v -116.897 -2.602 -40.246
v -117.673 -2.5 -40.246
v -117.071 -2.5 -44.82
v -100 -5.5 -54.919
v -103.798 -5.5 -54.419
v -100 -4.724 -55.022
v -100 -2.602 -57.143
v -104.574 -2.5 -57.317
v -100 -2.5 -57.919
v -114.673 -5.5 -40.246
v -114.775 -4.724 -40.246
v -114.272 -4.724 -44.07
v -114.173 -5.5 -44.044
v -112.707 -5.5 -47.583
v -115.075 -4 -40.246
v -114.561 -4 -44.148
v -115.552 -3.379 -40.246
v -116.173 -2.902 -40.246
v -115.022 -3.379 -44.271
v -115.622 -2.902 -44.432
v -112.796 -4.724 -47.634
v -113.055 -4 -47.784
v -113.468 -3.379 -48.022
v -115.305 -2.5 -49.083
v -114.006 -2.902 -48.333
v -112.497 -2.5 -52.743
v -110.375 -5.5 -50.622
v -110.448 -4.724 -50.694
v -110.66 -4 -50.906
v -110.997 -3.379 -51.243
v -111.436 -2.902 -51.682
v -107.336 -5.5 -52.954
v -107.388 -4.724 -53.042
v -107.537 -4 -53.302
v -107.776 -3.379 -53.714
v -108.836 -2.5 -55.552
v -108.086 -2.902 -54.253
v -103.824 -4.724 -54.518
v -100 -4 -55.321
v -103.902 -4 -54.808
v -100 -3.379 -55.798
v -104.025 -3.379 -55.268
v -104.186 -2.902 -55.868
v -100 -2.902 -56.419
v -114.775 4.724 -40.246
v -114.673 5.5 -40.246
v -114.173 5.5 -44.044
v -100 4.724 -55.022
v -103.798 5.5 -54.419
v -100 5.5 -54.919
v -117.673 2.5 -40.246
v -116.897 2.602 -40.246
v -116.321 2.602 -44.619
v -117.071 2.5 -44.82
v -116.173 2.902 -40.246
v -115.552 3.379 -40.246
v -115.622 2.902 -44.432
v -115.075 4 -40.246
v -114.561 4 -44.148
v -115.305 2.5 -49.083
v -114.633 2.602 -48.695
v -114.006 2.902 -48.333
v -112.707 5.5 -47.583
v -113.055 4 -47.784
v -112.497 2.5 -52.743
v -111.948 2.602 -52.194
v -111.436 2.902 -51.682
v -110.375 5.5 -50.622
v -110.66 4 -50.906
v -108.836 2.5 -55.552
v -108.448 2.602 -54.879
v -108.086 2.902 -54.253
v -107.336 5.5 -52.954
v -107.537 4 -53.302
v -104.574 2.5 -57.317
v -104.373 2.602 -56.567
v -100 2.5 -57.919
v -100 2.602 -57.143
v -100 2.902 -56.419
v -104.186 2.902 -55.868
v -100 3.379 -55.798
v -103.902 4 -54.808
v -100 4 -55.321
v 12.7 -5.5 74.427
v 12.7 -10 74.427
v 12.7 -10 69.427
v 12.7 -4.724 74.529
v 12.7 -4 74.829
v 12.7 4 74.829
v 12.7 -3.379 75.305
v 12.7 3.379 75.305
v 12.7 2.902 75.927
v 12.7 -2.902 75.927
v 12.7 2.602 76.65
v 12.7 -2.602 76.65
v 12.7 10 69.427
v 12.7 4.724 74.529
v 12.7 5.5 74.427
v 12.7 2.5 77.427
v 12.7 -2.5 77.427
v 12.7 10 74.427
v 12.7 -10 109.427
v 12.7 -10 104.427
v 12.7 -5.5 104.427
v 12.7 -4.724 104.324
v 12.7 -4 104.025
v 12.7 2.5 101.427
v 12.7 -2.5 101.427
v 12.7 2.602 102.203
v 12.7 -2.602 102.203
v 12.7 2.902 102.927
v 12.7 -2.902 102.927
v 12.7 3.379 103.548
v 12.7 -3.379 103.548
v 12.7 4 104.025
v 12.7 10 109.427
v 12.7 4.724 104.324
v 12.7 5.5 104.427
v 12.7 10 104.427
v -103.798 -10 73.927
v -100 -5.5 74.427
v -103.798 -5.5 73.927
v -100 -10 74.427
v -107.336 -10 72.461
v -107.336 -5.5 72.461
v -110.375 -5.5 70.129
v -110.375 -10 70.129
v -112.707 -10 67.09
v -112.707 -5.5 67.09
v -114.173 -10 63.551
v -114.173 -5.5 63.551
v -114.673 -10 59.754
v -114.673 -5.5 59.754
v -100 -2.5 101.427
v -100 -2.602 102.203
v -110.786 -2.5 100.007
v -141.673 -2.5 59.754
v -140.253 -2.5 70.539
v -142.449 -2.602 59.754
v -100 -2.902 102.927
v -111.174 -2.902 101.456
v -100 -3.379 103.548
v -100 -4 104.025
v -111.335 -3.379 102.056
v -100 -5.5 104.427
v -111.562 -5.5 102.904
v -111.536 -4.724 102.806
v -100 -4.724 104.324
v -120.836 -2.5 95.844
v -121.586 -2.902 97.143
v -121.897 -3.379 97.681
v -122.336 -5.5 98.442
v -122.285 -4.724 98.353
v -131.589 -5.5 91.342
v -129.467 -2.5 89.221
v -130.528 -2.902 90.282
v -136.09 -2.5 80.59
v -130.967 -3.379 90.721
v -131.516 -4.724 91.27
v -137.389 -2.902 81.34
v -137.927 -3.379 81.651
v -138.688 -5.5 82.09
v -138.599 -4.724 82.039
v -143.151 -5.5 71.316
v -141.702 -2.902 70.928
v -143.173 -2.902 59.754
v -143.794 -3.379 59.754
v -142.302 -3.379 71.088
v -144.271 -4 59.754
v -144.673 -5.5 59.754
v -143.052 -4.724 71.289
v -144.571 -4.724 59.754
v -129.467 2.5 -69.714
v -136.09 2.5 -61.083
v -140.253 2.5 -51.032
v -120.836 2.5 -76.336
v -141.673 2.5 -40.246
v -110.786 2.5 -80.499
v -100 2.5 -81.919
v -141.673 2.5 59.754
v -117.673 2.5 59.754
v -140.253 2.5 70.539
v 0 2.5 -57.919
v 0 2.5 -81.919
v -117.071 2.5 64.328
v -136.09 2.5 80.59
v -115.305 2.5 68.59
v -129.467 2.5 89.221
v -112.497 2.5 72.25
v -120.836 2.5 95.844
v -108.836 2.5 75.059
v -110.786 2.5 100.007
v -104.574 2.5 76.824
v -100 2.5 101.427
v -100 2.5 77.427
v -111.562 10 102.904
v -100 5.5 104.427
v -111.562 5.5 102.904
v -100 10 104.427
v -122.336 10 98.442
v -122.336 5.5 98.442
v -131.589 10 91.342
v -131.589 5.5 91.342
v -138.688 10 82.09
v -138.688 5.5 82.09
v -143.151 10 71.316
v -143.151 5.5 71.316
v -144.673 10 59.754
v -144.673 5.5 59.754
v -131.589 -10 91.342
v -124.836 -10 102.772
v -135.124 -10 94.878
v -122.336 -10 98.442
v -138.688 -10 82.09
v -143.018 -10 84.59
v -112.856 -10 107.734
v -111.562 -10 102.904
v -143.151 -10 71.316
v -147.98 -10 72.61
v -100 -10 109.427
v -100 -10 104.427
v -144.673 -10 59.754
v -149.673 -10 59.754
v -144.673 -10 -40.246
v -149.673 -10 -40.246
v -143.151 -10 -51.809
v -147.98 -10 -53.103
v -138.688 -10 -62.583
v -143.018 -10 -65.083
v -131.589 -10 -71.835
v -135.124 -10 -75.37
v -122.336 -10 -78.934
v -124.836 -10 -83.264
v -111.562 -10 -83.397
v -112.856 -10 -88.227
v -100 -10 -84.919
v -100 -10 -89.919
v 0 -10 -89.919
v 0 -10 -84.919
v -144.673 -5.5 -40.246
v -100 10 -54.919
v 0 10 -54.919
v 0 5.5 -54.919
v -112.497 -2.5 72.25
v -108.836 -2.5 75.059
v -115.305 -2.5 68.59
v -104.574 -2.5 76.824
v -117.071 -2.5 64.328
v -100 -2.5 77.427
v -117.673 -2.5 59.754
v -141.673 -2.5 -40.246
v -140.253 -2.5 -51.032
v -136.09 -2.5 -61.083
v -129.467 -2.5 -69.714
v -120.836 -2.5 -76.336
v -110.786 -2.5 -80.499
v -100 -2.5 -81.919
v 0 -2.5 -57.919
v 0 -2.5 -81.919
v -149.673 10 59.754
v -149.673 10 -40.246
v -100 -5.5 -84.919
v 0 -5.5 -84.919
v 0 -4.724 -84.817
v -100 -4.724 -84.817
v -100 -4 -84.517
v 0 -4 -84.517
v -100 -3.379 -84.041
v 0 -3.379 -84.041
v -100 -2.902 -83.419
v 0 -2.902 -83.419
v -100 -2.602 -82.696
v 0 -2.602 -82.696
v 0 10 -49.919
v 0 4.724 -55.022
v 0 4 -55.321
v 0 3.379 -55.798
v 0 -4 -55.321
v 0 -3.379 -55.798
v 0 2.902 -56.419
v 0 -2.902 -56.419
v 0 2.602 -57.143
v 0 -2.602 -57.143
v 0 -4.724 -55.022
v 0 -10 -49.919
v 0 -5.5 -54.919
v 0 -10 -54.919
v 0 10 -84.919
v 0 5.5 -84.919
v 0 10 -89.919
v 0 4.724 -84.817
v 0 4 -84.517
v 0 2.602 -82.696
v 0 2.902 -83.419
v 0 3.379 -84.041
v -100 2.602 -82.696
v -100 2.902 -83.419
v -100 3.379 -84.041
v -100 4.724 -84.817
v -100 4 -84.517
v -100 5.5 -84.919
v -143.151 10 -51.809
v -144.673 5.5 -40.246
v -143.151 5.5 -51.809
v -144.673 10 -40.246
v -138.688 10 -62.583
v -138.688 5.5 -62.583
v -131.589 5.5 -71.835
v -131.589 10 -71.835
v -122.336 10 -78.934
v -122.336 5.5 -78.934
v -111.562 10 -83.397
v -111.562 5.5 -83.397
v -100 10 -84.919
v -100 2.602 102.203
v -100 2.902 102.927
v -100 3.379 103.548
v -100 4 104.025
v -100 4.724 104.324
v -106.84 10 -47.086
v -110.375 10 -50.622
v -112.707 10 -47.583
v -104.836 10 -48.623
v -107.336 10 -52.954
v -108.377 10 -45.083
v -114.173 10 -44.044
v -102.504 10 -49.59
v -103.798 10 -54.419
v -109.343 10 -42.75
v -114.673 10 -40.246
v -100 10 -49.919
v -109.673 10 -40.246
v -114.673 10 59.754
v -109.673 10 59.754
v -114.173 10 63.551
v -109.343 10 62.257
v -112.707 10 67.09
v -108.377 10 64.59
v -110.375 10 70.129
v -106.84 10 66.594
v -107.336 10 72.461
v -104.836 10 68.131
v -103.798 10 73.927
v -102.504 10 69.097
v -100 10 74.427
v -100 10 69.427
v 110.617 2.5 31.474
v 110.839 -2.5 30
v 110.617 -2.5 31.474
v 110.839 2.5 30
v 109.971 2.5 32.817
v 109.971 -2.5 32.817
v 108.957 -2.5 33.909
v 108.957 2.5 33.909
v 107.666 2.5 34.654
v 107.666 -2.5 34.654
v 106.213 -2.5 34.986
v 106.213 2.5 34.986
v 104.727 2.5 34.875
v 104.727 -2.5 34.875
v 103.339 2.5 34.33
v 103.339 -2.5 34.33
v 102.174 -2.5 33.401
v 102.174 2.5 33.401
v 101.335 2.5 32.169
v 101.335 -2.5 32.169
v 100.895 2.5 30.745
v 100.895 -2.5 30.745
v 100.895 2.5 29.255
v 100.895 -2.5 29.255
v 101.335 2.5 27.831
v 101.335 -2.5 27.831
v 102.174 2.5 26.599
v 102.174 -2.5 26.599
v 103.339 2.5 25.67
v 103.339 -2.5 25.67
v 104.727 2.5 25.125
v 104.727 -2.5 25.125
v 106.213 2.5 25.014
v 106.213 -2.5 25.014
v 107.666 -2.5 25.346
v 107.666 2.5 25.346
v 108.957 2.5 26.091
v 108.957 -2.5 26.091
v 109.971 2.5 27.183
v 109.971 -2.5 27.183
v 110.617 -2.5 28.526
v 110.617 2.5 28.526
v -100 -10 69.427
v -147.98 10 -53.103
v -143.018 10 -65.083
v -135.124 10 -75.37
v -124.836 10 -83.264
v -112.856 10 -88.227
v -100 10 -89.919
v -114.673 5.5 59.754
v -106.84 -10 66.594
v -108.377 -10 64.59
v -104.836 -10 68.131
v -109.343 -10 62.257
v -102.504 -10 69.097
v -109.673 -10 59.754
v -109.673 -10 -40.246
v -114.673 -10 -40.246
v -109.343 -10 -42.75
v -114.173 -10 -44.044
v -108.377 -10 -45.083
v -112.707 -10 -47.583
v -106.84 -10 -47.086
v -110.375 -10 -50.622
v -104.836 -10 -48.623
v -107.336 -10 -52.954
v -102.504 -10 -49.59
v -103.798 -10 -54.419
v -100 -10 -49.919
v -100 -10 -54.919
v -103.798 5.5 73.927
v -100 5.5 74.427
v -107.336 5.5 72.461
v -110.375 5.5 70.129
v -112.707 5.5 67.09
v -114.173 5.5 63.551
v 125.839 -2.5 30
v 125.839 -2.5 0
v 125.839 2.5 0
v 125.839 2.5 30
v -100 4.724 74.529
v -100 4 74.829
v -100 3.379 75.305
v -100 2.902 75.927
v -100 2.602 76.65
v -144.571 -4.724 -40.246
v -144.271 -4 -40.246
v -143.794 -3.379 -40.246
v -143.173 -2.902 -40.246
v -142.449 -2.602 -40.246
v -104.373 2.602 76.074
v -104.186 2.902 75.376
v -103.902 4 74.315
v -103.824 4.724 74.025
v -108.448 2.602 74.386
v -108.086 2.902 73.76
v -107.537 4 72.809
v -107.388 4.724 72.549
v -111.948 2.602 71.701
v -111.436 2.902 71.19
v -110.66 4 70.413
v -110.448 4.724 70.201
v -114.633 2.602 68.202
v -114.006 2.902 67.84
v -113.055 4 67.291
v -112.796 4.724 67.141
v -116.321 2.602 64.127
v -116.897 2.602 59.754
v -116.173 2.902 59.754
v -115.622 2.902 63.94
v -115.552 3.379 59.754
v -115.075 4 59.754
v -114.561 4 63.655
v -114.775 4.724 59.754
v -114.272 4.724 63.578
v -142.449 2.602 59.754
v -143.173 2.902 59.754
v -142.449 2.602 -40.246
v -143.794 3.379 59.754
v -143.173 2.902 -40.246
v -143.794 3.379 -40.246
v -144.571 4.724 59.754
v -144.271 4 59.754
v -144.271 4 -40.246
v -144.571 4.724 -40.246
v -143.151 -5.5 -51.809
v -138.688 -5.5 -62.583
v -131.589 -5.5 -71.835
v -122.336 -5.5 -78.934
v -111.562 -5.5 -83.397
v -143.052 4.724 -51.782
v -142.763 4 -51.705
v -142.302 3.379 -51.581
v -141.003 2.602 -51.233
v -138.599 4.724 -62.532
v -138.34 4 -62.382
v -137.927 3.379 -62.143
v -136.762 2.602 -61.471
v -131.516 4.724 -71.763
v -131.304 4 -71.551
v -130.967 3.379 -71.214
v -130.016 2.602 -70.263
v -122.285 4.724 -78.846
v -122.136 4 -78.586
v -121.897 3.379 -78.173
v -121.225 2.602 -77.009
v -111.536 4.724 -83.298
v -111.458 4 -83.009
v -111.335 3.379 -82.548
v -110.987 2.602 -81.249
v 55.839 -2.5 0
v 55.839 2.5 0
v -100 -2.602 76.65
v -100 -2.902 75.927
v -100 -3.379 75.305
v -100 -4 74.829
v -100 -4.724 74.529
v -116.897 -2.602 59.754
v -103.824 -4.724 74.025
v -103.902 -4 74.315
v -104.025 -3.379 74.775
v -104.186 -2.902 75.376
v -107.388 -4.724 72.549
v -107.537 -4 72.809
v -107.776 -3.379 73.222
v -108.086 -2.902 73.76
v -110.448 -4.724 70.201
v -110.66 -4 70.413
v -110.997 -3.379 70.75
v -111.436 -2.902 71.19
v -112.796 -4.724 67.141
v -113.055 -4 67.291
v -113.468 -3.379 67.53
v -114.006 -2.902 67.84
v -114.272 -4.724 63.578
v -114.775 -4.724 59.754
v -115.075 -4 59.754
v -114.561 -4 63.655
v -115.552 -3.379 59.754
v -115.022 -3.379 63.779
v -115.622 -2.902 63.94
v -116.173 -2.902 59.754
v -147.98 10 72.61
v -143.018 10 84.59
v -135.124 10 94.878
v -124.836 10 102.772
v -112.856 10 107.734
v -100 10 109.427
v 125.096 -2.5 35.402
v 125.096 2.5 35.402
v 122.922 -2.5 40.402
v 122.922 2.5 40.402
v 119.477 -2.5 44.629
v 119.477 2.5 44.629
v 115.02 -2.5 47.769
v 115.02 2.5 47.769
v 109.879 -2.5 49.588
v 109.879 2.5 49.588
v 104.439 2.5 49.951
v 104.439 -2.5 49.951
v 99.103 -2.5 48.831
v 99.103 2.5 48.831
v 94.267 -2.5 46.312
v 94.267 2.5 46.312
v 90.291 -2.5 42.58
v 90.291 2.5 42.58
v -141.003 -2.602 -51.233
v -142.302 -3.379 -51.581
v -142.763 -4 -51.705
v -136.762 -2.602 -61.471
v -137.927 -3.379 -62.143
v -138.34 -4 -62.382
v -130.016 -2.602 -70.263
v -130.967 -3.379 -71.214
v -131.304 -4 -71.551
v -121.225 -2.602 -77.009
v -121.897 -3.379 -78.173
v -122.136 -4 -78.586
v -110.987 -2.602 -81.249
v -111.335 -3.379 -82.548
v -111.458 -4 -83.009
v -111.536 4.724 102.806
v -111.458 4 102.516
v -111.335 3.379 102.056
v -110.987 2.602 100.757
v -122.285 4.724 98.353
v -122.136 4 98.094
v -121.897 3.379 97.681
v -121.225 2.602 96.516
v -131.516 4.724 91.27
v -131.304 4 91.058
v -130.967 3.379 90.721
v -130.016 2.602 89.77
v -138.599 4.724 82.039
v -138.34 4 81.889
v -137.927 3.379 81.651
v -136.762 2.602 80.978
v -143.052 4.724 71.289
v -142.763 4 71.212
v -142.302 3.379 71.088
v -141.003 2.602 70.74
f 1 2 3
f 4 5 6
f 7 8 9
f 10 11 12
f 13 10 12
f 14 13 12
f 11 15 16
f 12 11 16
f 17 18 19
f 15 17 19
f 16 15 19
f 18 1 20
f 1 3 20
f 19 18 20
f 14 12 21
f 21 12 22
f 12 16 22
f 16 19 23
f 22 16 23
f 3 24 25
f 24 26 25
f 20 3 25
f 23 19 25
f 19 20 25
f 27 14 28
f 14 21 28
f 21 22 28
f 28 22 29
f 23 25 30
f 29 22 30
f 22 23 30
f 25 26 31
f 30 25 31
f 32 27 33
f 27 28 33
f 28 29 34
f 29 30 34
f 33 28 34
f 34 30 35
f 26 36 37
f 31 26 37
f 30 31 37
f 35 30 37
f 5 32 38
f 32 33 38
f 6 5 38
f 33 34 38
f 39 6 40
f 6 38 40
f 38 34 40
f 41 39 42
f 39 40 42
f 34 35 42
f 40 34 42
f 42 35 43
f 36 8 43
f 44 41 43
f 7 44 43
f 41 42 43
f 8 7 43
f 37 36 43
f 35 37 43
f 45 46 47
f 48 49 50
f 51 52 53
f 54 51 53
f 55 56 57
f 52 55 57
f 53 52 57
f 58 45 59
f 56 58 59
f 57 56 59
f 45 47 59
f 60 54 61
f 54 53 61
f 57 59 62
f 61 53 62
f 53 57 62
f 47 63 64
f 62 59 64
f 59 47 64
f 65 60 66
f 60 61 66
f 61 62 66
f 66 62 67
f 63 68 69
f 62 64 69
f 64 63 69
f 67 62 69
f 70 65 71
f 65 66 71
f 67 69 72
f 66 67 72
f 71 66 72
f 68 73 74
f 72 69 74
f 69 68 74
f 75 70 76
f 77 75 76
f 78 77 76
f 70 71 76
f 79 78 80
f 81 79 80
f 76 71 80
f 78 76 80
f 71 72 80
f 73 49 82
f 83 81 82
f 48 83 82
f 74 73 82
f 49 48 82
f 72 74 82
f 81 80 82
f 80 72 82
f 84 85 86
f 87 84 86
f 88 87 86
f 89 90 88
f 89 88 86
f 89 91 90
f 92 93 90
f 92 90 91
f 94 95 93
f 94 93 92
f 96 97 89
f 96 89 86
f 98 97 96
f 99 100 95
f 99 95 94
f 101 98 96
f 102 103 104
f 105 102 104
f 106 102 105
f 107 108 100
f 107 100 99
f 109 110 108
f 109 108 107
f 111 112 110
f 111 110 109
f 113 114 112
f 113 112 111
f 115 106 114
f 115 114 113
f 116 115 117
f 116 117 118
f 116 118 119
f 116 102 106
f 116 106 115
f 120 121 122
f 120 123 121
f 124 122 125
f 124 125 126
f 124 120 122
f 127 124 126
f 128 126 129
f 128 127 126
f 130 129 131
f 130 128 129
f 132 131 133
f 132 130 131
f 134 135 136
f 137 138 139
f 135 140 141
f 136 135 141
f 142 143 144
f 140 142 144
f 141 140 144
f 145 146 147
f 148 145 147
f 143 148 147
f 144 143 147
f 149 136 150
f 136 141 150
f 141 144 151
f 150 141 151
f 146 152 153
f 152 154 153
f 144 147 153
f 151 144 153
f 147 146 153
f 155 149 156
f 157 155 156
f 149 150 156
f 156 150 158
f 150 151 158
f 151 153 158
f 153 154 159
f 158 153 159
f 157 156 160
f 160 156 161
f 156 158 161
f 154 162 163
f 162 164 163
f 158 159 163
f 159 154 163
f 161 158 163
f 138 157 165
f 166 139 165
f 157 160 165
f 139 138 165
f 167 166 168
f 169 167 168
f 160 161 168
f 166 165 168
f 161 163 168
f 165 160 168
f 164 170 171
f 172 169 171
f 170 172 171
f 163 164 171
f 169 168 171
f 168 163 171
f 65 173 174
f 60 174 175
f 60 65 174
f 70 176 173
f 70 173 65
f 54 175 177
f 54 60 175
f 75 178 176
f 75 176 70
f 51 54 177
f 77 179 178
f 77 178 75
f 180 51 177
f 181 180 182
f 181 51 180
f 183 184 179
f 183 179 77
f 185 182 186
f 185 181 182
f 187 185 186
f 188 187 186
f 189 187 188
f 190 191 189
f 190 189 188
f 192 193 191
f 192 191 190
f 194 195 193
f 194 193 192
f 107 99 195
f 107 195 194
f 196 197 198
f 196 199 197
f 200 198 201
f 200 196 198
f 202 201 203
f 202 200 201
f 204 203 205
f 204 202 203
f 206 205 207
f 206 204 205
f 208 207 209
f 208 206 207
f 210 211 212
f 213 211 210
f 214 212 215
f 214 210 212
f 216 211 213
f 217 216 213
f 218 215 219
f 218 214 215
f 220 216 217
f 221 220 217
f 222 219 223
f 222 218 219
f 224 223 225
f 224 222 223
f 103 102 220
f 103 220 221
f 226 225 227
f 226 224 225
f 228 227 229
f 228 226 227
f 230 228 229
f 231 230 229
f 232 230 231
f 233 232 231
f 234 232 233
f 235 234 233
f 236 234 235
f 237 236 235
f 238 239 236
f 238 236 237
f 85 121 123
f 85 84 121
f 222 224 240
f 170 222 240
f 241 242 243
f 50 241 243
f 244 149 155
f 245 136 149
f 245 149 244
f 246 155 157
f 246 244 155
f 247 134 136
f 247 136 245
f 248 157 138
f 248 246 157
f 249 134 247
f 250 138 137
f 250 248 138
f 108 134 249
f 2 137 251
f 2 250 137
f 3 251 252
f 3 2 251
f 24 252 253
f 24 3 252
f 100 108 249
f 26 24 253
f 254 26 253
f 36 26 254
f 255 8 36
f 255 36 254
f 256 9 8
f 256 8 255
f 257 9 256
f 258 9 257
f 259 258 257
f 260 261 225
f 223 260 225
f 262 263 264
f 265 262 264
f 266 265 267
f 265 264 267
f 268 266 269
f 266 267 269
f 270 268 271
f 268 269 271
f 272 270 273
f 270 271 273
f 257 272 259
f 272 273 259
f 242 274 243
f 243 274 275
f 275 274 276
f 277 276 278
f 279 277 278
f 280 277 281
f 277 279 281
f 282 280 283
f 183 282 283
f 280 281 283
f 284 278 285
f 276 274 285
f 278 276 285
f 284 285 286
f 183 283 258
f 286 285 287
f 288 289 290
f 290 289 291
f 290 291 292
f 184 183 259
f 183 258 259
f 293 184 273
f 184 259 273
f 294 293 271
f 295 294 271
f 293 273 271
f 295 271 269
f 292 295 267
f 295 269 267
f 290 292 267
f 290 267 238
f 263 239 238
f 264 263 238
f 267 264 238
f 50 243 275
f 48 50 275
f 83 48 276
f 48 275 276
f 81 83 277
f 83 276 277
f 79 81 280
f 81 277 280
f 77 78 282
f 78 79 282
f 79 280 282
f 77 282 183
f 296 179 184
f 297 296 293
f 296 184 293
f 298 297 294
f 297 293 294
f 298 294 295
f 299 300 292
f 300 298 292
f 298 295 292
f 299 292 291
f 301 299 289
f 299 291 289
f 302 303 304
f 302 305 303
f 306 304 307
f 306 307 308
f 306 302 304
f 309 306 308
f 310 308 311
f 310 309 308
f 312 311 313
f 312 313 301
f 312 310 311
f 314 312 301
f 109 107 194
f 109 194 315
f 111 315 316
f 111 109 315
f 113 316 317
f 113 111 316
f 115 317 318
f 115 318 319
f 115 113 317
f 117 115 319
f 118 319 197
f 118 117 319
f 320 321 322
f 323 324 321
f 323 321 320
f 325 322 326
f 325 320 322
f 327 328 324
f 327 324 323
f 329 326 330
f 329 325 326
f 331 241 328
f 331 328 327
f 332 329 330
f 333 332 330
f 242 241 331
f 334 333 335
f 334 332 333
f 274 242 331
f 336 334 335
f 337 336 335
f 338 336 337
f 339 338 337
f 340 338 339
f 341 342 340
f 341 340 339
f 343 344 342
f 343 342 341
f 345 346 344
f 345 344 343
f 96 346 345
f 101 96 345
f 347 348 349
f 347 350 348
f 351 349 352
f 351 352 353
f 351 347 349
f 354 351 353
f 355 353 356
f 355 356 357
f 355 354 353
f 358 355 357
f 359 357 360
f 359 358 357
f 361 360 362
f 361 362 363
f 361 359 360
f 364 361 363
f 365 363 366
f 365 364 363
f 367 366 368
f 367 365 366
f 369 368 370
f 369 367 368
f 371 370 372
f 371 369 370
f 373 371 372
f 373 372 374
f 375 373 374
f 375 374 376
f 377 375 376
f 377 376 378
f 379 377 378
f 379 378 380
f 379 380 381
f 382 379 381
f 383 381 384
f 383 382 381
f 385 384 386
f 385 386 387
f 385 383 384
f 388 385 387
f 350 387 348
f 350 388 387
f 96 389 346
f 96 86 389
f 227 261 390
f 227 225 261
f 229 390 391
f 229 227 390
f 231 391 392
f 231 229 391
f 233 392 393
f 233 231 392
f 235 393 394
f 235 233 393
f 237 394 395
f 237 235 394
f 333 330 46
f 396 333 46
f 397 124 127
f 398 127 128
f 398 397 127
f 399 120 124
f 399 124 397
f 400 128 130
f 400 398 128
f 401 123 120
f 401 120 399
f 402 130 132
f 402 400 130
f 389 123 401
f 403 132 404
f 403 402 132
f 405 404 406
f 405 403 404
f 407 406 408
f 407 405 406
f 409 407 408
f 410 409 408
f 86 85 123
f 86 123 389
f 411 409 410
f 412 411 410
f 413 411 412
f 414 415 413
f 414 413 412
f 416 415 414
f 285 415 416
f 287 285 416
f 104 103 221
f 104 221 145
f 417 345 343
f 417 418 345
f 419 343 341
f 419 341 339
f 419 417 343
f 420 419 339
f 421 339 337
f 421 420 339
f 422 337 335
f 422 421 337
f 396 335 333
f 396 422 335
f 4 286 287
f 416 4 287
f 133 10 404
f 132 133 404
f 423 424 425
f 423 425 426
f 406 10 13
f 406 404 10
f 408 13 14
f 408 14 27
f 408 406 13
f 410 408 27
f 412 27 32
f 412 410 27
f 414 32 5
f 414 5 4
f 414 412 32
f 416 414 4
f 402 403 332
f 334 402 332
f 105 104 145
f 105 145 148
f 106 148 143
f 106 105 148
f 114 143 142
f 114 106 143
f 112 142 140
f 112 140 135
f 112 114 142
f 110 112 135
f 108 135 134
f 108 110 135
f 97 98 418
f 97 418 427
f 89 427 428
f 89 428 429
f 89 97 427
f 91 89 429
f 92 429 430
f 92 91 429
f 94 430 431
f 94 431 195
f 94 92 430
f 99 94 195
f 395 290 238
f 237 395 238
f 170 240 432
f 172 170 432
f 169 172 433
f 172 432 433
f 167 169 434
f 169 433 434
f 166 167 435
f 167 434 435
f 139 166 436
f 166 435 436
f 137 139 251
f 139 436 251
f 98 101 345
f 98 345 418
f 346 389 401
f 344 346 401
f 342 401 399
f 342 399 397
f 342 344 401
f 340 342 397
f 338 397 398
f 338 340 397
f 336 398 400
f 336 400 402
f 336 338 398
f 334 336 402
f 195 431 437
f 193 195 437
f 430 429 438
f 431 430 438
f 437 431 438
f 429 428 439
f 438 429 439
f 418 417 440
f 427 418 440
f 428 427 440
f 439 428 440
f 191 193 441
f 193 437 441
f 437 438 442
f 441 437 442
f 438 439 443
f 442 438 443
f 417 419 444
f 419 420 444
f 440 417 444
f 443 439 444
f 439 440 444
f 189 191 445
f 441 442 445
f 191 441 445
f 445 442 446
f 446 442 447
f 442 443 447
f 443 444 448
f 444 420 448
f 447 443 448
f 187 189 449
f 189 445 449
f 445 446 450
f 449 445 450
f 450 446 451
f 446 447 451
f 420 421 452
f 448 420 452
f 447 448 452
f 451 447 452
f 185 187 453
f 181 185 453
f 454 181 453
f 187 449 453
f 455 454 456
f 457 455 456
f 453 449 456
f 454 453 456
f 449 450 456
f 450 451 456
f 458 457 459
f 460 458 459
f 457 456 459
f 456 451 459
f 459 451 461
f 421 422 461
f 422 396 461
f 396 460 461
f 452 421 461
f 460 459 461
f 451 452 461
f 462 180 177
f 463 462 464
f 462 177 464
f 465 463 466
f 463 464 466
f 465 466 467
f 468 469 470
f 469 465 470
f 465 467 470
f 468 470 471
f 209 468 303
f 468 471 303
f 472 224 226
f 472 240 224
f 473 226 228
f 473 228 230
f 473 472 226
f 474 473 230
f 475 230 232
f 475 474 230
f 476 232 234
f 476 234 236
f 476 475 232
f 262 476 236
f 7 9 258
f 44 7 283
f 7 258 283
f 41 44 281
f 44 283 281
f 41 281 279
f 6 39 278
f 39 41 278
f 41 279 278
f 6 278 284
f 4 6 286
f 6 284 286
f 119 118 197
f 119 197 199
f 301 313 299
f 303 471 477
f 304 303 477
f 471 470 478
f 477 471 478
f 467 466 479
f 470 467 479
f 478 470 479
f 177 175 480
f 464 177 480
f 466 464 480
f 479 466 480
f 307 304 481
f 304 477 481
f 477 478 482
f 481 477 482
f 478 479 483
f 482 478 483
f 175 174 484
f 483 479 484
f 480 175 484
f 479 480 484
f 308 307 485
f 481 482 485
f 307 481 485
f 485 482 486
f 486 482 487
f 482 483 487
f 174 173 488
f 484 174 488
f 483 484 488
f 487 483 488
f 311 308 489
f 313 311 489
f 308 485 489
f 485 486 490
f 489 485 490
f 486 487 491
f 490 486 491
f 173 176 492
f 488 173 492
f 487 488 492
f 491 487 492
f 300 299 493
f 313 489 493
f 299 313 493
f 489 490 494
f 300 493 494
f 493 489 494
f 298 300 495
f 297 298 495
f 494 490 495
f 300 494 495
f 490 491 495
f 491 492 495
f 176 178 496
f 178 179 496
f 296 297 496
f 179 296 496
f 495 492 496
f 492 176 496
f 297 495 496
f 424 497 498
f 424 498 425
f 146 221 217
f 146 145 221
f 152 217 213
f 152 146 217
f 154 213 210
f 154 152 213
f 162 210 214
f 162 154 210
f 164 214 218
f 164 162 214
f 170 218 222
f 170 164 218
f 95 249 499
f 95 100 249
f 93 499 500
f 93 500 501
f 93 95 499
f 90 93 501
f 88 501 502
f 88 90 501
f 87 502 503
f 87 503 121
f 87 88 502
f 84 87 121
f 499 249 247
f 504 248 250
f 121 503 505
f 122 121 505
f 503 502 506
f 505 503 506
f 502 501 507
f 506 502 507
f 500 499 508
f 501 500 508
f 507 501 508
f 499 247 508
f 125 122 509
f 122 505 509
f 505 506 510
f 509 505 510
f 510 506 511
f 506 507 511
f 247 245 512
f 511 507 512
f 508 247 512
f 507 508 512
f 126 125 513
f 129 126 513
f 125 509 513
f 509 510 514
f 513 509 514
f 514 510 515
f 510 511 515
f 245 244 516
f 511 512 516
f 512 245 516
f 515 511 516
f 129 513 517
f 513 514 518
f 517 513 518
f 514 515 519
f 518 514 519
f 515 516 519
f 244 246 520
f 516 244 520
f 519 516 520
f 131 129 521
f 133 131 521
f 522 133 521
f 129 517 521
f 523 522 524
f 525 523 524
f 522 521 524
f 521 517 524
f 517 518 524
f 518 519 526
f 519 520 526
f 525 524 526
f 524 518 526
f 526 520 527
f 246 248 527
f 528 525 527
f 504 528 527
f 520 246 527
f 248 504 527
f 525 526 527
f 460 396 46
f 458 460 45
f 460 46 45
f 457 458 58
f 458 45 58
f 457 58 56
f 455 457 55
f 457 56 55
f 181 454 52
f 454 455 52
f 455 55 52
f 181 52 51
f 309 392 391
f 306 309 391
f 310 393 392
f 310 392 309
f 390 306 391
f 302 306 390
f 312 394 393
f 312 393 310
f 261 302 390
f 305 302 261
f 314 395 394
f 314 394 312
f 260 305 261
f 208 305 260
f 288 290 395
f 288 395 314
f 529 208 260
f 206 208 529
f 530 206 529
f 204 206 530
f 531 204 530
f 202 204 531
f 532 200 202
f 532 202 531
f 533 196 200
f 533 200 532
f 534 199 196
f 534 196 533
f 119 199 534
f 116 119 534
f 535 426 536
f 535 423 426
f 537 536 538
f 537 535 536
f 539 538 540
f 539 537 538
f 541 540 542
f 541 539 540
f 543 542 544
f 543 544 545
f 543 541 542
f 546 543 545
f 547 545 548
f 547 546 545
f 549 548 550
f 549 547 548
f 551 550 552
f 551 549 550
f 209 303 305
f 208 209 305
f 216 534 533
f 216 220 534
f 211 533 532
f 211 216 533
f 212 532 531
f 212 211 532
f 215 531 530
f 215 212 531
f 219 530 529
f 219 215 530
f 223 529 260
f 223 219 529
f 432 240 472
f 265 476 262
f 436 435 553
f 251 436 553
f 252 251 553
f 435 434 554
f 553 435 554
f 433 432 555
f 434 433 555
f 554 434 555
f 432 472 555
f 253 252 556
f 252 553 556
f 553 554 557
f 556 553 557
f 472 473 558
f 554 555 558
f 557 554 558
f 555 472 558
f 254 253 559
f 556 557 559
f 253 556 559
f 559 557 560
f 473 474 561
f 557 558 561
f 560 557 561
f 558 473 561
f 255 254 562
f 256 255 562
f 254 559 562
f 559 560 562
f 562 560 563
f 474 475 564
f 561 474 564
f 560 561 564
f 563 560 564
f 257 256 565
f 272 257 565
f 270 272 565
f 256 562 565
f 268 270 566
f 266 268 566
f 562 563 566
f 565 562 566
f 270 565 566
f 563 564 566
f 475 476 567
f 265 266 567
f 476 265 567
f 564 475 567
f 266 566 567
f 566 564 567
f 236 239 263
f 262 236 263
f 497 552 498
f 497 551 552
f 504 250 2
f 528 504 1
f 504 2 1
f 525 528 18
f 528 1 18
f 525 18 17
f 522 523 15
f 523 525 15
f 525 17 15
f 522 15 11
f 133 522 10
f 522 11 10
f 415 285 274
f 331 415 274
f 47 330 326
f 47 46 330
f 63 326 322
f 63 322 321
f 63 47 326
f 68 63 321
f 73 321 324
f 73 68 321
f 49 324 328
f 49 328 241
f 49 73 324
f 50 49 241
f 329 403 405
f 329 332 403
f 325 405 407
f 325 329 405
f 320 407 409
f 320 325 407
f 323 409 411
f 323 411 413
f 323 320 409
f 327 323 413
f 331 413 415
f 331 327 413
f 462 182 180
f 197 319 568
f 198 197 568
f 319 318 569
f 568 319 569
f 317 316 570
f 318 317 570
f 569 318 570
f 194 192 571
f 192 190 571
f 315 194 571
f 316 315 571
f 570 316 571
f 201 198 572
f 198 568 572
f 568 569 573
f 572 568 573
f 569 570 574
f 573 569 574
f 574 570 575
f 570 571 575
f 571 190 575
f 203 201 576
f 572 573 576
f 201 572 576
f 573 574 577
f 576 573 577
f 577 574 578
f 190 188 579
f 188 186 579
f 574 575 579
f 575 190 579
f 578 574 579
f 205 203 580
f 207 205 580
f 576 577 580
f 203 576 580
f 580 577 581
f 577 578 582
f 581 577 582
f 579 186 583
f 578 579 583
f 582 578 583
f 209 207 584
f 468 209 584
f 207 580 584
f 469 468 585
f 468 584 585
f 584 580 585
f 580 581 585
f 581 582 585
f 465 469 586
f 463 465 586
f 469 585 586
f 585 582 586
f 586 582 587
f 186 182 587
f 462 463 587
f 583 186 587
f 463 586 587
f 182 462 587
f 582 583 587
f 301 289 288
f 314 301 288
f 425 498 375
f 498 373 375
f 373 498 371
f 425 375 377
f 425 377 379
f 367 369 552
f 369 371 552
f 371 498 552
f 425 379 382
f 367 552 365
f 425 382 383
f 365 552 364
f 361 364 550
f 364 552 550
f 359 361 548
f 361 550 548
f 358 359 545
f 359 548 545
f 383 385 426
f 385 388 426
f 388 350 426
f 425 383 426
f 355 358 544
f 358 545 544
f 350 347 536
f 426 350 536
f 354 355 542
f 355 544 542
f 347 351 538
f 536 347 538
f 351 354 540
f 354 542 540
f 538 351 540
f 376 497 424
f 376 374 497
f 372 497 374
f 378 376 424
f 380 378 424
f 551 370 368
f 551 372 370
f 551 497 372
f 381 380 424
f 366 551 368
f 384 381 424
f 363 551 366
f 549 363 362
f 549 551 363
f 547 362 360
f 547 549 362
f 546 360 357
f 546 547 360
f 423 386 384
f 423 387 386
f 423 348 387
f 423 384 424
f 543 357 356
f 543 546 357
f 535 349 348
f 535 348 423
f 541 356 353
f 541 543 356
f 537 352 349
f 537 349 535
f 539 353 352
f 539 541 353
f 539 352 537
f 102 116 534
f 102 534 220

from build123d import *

# Parameters (mm, degrees)
F2_DEPTH = 12.7
F4_R     = 5
F5_DEPTH = 2.5


with BuildPart() as f2:
    # F0 (on Right) → F2 (new body, symmetric)
    with BuildSketch(Plane.YZ):
        with BuildLine():
            Line((-10, 69.4266632199), (0, 69.4266632199))
            Line((0, 69.4266632199), (10, 69.4266632199))
            Line((10, 69.4266632199), (10, 74.4266632199))
            Line((10, 74.4266632199), (5.5, 74.4266632199))
            ThreePointArc((5.5, 74.4266632199), (3.3786796564, 75.3053428764), (2.5, 77.4266632199))
            Line((2.5, 77.4266632199), (2.5, 101.4266632199))
            ThreePointArc((2.5, 101.4266632199), (3.3786796564, 103.5479835635), (5.5, 104.4266632199))
            Line((5.5, 104.4266632199), (10, 104.4266632199))
            Line((10, 104.4266632199), (10, 109.4266632199))
            Line((10, 109.4266632199), (0, 109.4266632199))
            Line((0, 109.4266632199), (-10, 109.4266632199))
            Line((-10, 109.4266632199), (-10, 104.4266632199))
            Line((-10, 104.4266632199), (-5.5, 104.4266632199))
            ThreePointArc((-5.5, 104.4266632199), (-3.3786796564, 103.5479835635), (-2.5, 101.4266632199))
            Line((-2.5, 101.4266632199), (-2.5, 77.4266632199))
            ThreePointArc((-2.5, 77.4266632199), (-3.3786796564, 75.3053428764), (-5.5, 74.4266632199))
            Line((-5.5, 74.4266632199), (-10, 74.4266632199))
            Line((-10, 74.4266632199), (-10, 69.4266632199))
        make_face()
    extrude(amount=F2_DEPTH, both=True)

    # F3: sweep along a path in F1
    with BuildLine(Plane.XZ) as f3_path:
        Line((0, 69.7536692023), (-100, 69.7536692023))
        ThreePointArc((-100, 69.7536692023), (-107.0710678119, 66.8247370142), (-110, 59.7536692023))
        Line((-110, 59.7536692023), (-110, -40.2463307977))
        ThreePointArc((-110, -40.2463307977), (-107.0710678119, -47.3173986095), (-100, -50.2463307977))
        Line((-100, -50.2463307977), (0, -50.2463307977))
    # F0 (on Right) → F3 (sweep)
    with BuildSketch(Plane.YZ):
        with BuildLine():
            Line((-10, 69.4266632199), (0, 69.4266632199))
            Line((0, 69.4266632199), (10, 69.4266632199))
            Line((10, 69.4266632199), (10, 74.4266632199))
            Line((10, 74.4266632199), (5.5, 74.4266632199))
            ThreePointArc((5.5, 74.4266632199), (3.3786796564, 75.3053428764), (2.5, 77.4266632199))
            Line((2.5, 77.4266632199), (2.5, 101.4266632199))
            ThreePointArc((2.5, 101.4266632199), (3.3786796564, 103.5479835635), (5.5, 104.4266632199))
            Line((5.5, 104.4266632199), (10, 104.4266632199))
            Line((10, 104.4266632199), (10, 109.4266632199))
            Line((10, 109.4266632199), (0, 109.4266632199))
            Line((0, 109.4266632199), (-10, 109.4266632199))
            Line((-10, 109.4266632199), (-10, 104.4266632199))
            Line((-10, 104.4266632199), (-5.5, 104.4266632199))
            ThreePointArc((-5.5, 104.4266632199), (-3.3786796564, 103.5479835635), (-2.5, 101.4266632199))
            Line((-2.5, 101.4266632199), (-2.5, 77.4266632199))
            ThreePointArc((-2.5, 77.4266632199), (-3.3786796564, 75.3053428764), (-5.5, 74.4266632199))
            Line((-5.5, 74.4266632199), (-10, 74.4266632199))
            Line((-10, 74.4266632199), (-10, 69.4266632199))
        make_face()
    sweep(path=f3_path.line)


with BuildPart() as f5:
    # F4 (on Front) → F5 (new body, symmetric)
    with BuildSketch(Plane.XZ):
        with BuildLine():
            Line((90.2913753359, 42.5800752207), (55.8394204684, 0))
            Line((55.8394204684, 0), (125.8394204684, 0))
            Line((125.8394204684, 0), (125.8394204684, 30))
            ThreePointArc((125.8394204684, 30), (112.5117175747, 48.8541892248), (90.2913753359, 42.5800752207))
        make_face()
        with Locations((105.8394204684, 30)):
            Circle(F4_R, mode=Mode.SUBTRACT)
    extrude(amount=F5_DEPTH, both=True)


solid = Compound([f2.part, f5.part])
